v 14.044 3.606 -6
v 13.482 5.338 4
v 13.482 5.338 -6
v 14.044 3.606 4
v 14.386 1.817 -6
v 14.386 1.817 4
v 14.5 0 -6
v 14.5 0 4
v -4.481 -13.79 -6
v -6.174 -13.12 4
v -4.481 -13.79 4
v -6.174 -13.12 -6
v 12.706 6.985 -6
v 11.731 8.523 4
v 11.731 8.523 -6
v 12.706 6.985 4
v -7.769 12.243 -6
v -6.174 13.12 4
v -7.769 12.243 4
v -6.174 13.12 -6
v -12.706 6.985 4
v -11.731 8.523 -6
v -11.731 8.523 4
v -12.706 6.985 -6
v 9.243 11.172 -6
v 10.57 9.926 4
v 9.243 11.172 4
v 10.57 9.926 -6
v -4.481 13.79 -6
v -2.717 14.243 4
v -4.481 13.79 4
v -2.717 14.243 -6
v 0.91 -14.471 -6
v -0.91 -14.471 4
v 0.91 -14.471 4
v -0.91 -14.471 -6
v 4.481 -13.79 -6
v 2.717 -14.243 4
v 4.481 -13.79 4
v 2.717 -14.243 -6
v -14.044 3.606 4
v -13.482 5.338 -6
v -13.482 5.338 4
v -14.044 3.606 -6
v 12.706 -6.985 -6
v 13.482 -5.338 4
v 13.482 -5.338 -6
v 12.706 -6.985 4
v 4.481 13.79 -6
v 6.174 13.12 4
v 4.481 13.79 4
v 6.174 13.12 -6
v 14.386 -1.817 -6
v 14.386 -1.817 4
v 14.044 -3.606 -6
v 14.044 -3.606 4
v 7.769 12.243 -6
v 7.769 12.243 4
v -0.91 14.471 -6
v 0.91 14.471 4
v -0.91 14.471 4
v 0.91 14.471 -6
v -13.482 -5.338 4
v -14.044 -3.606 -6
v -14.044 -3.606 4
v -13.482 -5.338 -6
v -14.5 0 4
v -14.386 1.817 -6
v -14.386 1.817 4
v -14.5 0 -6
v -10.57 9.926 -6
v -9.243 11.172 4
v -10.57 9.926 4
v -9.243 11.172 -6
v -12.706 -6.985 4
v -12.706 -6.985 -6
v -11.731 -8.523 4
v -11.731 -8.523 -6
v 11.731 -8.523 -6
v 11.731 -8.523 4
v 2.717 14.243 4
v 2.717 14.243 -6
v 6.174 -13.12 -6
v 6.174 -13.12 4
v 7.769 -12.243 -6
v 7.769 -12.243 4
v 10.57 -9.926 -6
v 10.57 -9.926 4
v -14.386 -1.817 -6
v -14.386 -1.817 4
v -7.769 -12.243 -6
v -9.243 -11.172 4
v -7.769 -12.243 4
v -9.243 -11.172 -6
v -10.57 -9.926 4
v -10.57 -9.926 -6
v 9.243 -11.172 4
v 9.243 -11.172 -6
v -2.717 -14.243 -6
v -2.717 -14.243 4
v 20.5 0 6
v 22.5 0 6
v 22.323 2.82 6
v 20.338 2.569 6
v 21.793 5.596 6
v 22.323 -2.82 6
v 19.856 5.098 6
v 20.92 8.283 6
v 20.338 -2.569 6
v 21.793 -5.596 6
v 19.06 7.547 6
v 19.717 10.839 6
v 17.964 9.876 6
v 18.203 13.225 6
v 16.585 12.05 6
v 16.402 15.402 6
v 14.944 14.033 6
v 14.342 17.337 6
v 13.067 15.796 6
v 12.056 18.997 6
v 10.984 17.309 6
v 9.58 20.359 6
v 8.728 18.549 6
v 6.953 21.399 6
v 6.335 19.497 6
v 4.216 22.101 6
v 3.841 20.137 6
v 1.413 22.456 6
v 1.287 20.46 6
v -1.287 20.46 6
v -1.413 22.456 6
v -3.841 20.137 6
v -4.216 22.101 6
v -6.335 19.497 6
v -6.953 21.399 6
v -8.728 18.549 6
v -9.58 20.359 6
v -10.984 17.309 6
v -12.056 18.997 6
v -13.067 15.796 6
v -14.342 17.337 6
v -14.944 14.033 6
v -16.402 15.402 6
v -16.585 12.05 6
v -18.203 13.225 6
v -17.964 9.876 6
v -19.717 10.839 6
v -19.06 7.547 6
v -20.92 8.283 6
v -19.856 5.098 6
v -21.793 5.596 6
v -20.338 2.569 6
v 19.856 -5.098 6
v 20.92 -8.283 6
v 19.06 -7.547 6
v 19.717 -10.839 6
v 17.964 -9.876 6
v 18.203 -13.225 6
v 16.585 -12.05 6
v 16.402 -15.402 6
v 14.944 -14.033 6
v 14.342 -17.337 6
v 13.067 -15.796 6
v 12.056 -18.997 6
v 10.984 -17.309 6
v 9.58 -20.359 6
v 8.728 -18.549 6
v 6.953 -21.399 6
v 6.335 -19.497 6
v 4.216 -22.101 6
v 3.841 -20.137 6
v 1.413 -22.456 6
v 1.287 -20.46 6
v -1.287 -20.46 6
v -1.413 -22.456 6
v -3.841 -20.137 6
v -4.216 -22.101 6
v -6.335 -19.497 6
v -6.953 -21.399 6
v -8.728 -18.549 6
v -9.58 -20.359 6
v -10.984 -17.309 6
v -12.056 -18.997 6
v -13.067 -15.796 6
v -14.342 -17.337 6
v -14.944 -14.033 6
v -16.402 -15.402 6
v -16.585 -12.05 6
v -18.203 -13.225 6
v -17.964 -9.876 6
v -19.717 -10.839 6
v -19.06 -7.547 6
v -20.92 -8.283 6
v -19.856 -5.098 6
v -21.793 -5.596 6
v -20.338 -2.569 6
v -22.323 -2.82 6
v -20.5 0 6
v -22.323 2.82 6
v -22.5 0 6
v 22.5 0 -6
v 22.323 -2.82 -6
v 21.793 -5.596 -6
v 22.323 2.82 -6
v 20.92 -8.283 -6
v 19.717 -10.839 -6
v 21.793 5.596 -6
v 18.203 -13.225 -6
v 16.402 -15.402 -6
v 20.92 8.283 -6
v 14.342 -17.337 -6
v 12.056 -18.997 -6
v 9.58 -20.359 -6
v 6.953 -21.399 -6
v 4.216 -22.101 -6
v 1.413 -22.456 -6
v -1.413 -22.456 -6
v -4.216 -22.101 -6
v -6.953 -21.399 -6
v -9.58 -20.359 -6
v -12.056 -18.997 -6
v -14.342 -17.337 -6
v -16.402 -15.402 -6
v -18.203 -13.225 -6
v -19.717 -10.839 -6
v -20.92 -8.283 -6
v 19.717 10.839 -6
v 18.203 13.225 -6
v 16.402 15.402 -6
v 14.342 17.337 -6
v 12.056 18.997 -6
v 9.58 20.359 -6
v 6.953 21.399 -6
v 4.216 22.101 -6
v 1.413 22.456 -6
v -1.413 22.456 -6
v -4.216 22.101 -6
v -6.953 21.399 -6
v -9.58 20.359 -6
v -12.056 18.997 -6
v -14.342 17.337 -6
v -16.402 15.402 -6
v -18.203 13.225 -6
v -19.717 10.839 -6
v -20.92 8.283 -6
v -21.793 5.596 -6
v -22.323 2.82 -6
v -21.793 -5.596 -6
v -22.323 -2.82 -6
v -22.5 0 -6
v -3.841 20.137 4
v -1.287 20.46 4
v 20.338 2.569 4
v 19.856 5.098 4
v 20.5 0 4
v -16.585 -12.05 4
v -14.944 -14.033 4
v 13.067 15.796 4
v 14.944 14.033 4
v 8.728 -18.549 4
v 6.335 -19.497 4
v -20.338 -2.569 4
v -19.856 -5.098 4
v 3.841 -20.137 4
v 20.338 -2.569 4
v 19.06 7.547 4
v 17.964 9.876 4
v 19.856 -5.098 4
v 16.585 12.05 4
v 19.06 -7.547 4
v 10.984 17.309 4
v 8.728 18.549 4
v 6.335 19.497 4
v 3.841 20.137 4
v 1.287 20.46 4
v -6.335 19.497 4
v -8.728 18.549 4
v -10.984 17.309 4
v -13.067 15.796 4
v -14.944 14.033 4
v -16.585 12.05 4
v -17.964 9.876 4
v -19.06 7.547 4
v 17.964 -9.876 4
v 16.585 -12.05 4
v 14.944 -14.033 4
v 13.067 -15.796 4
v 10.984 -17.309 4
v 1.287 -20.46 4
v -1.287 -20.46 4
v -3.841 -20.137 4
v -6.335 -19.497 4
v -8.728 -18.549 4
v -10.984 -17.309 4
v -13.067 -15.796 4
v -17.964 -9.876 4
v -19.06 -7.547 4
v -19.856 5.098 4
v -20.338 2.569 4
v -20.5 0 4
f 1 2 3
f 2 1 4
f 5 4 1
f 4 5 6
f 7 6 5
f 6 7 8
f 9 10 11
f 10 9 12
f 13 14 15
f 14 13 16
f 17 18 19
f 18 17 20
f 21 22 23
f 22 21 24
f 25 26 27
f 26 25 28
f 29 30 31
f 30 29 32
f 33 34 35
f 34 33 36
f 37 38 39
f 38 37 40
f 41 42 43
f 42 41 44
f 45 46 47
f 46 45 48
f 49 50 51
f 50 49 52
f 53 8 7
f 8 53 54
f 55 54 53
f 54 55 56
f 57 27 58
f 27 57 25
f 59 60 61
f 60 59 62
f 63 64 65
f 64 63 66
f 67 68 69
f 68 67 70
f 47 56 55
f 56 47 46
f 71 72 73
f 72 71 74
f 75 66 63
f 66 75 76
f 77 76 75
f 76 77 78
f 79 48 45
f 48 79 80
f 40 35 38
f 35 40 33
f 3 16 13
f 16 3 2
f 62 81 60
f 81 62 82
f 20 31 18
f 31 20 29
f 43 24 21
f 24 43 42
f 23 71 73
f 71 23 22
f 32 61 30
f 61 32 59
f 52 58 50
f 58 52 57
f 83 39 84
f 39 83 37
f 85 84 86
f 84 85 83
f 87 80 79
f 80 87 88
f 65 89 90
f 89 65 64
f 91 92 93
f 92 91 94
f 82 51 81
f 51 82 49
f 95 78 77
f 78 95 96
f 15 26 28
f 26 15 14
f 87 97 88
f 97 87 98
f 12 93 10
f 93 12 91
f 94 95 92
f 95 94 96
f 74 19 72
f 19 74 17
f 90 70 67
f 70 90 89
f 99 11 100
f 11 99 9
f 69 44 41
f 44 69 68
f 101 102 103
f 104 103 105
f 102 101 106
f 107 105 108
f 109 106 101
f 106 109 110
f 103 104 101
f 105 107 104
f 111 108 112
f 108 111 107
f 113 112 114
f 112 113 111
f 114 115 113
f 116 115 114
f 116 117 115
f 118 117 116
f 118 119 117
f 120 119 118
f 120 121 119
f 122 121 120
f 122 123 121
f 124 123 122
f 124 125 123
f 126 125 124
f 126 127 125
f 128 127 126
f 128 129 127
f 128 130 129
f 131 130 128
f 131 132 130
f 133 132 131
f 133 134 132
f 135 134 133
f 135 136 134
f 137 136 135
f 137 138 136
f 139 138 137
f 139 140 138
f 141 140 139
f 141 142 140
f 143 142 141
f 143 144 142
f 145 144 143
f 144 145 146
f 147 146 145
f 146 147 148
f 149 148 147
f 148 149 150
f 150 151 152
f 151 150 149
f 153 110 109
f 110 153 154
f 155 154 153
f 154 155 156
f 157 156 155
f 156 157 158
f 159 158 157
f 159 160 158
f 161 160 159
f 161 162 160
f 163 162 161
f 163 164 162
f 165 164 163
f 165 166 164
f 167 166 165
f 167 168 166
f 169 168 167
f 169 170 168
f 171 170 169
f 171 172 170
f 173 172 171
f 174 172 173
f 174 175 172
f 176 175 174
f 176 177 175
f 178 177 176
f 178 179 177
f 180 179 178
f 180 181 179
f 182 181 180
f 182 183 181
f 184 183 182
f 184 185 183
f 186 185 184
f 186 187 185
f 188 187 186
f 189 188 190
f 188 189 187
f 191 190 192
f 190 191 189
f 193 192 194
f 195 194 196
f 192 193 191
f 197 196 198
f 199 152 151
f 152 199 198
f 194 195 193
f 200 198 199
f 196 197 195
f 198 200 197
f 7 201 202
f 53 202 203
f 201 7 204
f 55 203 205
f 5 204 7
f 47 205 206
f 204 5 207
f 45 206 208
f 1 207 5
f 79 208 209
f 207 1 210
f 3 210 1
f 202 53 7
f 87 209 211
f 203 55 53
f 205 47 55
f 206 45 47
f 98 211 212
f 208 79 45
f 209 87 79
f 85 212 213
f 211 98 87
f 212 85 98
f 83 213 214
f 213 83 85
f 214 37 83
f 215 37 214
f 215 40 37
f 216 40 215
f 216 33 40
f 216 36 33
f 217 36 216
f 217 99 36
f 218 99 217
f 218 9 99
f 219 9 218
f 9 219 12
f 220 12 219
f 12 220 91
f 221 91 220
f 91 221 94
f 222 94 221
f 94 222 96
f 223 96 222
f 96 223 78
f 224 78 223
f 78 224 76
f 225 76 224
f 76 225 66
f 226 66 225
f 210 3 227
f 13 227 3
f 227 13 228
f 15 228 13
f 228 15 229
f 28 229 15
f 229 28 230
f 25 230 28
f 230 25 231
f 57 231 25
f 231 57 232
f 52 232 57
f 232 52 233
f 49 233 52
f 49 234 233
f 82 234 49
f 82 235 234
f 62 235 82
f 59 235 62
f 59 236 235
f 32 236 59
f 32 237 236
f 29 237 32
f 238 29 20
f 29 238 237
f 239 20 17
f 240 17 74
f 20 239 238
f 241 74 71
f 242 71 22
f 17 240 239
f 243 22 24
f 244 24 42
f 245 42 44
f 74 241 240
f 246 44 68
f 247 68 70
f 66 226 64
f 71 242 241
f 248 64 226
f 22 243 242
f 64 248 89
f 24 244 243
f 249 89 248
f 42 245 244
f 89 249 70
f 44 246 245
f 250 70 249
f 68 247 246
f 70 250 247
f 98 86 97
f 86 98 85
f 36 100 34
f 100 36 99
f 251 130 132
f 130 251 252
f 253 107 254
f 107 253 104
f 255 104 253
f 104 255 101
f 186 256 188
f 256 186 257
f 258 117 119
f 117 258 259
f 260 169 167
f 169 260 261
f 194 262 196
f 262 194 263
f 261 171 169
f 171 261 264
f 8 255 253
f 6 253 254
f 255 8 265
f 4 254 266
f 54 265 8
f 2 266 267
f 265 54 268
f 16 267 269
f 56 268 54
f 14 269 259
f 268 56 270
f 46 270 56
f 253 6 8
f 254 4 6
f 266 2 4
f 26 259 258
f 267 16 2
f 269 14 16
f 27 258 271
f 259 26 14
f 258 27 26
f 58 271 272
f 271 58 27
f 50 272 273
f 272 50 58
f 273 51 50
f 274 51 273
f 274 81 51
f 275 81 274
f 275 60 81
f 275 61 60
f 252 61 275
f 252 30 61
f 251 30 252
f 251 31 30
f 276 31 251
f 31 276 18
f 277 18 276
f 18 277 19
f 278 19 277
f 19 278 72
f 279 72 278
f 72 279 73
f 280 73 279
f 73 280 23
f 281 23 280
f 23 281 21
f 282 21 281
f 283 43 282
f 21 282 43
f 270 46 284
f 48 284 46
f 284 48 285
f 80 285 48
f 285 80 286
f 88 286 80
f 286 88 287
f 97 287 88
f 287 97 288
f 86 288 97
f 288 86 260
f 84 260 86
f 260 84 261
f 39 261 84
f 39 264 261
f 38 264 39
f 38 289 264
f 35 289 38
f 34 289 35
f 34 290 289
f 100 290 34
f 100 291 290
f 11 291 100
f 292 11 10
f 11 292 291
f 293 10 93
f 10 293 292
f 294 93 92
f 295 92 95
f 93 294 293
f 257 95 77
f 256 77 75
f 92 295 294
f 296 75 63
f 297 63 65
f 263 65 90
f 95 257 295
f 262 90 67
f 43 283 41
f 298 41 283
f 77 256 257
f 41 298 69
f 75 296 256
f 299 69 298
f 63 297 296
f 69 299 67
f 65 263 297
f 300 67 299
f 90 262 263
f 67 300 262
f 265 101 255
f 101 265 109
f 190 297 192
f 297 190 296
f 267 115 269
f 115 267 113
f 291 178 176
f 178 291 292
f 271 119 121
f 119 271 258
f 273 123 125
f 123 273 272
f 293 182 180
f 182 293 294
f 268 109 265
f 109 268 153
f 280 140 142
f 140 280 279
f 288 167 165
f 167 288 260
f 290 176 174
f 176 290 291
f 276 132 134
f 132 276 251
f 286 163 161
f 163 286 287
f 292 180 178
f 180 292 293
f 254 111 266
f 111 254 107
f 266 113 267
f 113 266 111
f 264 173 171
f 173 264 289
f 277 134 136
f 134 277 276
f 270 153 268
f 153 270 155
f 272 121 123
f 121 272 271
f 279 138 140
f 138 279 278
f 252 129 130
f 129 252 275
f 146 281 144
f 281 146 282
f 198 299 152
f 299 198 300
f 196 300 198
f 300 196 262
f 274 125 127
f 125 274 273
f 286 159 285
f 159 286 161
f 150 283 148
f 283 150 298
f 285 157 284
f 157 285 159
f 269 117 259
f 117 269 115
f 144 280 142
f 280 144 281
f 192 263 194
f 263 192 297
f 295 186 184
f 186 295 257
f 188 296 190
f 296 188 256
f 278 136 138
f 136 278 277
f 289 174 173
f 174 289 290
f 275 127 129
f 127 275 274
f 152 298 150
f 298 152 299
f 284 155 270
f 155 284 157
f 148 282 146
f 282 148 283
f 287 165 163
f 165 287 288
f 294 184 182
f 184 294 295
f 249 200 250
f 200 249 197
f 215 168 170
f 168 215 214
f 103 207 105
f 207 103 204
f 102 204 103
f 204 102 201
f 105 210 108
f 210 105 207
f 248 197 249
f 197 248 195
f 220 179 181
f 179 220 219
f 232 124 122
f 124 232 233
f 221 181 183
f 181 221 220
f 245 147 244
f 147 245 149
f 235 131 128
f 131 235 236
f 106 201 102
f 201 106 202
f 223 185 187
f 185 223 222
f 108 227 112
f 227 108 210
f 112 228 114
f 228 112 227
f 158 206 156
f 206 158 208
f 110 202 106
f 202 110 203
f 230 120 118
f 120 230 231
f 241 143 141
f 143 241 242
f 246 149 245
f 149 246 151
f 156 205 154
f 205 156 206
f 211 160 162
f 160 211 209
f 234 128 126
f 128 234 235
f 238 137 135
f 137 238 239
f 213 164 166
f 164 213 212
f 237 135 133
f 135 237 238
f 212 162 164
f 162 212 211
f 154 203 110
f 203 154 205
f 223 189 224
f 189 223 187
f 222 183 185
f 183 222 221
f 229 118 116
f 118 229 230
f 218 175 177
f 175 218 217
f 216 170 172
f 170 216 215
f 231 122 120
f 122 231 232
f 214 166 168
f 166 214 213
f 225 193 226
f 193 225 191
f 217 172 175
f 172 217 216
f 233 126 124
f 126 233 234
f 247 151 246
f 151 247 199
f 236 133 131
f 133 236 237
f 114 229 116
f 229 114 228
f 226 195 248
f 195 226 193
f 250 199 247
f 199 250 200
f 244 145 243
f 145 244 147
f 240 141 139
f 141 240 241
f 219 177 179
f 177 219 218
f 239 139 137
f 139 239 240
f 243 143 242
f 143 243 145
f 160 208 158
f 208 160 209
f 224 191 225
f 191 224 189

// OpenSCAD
$fn = 50;


difference() {
	union() {
		translate(v = [0, 0, -6.0000000000]) {
			cylinder(h = 12, r = 22.5000000000);
		}
	}
	union() {
		#translate(v = [0, 0, -6.0000000000]) {
			cylinder(h = 12, r = 14.5000000000);
		}
		translate(v = [0, 0, 4.0000000000]) {
			cylinder(h = 2, r = 20.5000000000);
		}
	}
}
